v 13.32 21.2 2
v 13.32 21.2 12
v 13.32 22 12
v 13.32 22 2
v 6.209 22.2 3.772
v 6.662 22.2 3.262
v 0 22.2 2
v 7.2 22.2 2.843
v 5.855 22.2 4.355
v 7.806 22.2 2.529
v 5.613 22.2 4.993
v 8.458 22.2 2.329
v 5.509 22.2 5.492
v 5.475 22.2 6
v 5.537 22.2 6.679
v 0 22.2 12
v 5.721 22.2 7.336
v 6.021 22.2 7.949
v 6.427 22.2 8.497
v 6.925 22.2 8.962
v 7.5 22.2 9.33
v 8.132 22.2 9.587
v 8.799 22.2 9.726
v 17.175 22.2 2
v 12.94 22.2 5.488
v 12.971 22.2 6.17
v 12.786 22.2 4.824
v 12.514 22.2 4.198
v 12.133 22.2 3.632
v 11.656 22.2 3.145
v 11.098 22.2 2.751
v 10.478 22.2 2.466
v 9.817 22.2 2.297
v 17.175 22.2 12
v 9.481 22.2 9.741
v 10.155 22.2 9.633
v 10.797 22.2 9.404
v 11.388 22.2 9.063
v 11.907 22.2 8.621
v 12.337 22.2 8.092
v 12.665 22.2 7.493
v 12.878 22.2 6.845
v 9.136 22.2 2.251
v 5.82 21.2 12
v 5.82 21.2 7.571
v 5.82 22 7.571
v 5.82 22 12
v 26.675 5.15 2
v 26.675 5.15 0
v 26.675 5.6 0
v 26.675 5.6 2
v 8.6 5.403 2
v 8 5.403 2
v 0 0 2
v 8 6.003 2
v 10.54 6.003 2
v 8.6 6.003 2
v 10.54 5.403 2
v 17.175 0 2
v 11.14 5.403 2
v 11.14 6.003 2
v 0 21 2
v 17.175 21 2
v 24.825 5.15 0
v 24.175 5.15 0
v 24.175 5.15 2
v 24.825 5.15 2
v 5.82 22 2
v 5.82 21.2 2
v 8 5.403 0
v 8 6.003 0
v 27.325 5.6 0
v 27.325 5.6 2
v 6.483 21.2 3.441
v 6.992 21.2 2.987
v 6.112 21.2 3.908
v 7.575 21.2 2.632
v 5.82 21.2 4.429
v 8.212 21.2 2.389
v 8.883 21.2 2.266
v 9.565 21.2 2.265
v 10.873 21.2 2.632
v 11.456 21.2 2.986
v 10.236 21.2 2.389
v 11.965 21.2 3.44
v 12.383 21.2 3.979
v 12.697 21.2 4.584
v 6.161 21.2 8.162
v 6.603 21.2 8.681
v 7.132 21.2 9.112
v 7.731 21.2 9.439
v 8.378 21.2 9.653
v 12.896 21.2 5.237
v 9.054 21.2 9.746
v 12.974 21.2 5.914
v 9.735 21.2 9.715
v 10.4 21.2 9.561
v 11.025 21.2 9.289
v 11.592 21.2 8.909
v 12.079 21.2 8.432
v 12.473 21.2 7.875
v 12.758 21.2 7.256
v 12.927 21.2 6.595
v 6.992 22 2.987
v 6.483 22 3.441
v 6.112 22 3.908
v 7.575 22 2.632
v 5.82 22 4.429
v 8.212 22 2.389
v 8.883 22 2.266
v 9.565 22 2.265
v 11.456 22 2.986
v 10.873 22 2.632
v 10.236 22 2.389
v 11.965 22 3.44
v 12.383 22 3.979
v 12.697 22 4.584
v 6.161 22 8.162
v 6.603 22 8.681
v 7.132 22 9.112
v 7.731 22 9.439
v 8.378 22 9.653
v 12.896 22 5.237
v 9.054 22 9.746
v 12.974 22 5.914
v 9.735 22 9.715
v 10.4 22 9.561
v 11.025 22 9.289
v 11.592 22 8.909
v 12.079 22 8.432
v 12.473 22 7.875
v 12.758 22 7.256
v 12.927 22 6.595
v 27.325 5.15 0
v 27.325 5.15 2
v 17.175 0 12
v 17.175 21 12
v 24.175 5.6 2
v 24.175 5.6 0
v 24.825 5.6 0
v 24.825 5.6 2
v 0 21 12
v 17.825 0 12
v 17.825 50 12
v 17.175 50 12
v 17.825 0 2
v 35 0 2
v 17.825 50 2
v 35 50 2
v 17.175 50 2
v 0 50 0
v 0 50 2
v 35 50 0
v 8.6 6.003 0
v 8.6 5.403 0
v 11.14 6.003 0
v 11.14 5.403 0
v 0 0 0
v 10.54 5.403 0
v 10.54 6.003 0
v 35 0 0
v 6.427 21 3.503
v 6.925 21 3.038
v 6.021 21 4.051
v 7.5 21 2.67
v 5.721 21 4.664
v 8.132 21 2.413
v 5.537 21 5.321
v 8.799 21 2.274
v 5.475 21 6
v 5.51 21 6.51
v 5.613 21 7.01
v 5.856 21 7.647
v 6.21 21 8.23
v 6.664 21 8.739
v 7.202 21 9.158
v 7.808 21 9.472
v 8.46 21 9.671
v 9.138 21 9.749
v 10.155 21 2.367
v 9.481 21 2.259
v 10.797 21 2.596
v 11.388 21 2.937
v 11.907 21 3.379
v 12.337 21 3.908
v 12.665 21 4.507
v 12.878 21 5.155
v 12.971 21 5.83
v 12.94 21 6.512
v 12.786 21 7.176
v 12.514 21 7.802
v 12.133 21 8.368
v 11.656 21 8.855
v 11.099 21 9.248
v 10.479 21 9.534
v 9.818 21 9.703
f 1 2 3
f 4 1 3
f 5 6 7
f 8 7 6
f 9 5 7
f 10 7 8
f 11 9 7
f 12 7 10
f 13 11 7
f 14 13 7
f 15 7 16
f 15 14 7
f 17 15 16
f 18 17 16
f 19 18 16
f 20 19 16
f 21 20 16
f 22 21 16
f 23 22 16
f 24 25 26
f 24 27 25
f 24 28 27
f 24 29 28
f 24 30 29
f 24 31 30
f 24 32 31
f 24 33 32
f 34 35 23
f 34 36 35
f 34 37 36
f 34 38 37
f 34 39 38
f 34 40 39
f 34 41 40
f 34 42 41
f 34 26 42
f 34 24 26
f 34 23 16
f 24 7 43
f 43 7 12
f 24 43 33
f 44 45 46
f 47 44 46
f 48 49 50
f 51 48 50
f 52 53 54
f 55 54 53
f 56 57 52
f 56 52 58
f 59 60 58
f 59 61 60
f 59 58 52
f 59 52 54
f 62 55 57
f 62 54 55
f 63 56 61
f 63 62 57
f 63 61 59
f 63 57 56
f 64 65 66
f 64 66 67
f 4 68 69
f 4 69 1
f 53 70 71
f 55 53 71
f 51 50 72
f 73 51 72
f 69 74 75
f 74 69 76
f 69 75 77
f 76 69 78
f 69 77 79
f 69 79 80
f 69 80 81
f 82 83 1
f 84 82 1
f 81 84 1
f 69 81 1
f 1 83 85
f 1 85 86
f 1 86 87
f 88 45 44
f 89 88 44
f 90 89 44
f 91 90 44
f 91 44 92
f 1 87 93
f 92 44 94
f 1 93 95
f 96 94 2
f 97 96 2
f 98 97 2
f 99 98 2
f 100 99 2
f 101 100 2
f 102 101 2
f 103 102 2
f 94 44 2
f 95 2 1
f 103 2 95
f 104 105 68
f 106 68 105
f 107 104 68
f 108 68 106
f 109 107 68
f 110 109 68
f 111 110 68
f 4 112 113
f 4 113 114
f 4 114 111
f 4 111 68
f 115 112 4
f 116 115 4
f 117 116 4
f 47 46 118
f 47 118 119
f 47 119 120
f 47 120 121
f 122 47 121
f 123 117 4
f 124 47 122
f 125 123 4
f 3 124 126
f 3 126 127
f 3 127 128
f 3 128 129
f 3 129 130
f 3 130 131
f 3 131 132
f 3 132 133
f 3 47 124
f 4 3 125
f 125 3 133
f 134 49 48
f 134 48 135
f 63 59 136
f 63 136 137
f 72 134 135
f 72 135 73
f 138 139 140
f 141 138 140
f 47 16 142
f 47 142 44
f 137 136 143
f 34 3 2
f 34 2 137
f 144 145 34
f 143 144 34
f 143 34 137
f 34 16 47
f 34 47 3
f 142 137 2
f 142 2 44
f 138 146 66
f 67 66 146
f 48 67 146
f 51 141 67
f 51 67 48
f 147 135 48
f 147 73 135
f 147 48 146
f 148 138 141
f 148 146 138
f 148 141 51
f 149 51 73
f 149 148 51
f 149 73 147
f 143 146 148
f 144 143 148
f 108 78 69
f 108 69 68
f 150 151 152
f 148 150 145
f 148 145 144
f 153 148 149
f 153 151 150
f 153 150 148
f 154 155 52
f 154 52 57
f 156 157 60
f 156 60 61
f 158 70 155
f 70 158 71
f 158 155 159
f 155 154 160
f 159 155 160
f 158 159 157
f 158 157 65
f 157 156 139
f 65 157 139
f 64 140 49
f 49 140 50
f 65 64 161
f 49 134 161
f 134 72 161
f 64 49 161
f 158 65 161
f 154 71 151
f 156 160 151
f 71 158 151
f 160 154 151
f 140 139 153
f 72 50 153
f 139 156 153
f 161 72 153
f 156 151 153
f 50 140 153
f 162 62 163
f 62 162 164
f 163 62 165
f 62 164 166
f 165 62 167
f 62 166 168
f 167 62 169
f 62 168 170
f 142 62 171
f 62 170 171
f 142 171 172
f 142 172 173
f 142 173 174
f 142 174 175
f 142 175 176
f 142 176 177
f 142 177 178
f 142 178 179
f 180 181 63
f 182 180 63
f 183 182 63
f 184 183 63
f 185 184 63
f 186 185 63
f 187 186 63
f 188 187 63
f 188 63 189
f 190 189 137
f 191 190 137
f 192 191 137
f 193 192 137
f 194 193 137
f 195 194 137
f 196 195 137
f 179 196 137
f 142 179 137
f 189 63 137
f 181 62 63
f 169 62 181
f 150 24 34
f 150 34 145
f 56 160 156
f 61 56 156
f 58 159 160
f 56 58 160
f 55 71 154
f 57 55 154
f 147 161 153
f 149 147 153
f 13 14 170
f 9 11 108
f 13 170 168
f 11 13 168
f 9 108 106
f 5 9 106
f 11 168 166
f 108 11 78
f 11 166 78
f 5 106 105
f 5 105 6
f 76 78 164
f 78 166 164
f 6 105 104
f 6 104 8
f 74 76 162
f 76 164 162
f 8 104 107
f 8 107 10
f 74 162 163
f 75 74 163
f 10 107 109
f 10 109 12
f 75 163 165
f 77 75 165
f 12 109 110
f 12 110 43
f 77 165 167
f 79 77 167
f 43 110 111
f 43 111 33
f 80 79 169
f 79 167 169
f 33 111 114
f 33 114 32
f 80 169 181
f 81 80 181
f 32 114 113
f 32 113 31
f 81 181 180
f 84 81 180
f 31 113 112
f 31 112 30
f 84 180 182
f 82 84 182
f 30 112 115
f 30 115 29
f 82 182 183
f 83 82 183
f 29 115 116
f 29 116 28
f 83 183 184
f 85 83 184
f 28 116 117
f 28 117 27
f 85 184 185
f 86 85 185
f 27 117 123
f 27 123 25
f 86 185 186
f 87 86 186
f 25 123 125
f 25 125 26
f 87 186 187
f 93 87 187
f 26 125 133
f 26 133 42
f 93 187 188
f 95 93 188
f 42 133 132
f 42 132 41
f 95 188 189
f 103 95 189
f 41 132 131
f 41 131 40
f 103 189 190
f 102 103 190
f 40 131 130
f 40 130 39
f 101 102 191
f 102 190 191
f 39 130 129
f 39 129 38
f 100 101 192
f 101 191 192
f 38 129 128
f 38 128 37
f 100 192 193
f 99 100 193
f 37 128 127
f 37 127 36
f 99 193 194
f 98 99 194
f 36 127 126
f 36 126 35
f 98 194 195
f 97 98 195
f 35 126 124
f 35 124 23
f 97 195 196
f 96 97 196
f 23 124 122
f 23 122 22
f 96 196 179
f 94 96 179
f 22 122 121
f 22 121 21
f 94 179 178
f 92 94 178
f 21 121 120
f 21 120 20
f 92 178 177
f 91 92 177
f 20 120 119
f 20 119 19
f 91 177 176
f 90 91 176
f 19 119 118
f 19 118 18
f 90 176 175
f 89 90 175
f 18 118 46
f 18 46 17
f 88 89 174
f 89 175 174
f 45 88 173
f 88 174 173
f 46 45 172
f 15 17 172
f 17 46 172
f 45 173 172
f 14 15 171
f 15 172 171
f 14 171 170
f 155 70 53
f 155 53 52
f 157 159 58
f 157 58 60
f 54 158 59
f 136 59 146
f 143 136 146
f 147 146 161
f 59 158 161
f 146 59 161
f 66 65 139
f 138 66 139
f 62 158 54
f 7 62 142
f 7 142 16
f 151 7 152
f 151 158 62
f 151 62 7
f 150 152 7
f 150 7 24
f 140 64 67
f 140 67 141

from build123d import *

# Parameters (mm, degrees)
IZIM1_W                     = 35
IZIM1_H                     = 50
IZIM1_W_2                   = 0.6
IZIM1_H_2                   = 0.6
IZIM1_W_3                   = 0.65
IZIM1_H_3                   = 0.45
Y_KSEKLIK_EKSTR_ZYON1_DEPTH = 2
IZIM2_W                     = 0.65
IZIM2_H                     = 50
Y_KSEKLIK_EKSTR_ZYON2_DEPTH = 10
IZIM3_W                     = 10
IZIM3_H                     = 1.2
Y_KSEKLIK_EKSTR_ZYON3_DEPTH = 17.175
IZIM4_W                     = 7.5
IZIM4_H                     = 0.8
KES_EKSTR_ZYON1_DEPTH       = 10
KES_EKSTR_ZYON2_REACH       = 49.011
IZIM5_RX                    = 3.75
IZIM5_RY                    = 3.75


with BuildPart() as part:
    # Çizim1 → Yükseklik-Ekstrüzyon1 (new body)
    with BuildSketch(Plane.XY):
        with Locations((17.5, 25)):
            Rectangle(IZIM1_W, IZIM1_H)
        with Locations((8.3, 5.703429896)):
            Rectangle(IZIM1_W_2, IZIM1_H_2, mode=Mode.SUBTRACT)
        with Locations((10.84, 5.703429896)):
            Rectangle(IZIM1_W_2, IZIM1_H_2, mode=Mode.SUBTRACT)
        with Locations((27, 5.375)):
            Rectangle(IZIM1_W_3, IZIM1_H_3, mode=Mode.SUBTRACT)
        with Locations((24.5, 5.375)):
            Rectangle(IZIM1_W_3, IZIM1_H_3, mode=Mode.SUBTRACT)
    extrude(amount=Y_KSEKLIK_EKSTR_ZYON1_DEPTH)

    # Çizim2 → Yükseklik-Ekstrüzyon2 (add)
    with BuildSketch(Plane.XY.offset(2)):
        with Locations((17.5, 25)):
            Rectangle(IZIM2_W, IZIM2_H)
    extrude(amount=Y_KSEKLIK_EKSTR_ZYON2_DEPTH)

    # Çizim3 → Yükseklik-Ekstrüzyon3 (add, through all)
    with BuildSketch(Plane.ZY.offset(-17.175)):
        with Locations((7, 21.6)):
            Rectangle(IZIM3_W, IZIM3_H)
    extrude(amount=Y_KSEKLIK_EKSTR_ZYON3_DEPTH)

    # Çizim4 → Kes-Ekstrüzyon1 (cut)
    with BuildSketch(Plane.XY.offset(12)):
        with Locations((9.57, 21.6)):
            Rectangle(IZIM4_W, IZIM4_H)
    extrude(amount=-KES_EKSTR_ZYON1_DEPTH, mode=Mode.SUBTRACT)

    # Çizim5 → Kes-Ekstrüzyon2 (cut, up to next)
    with BuildSketch(Plane.XZ.offset(-21), mode=Mode.PRIVATE) as kes_ekstr_zyon2_sk1:
        with Locations(Location((9.224839589, 6), (0, 0, 180))):
            Ellipse(IZIM5_RX, IZIM5_RY)
    kes_ekstr_zyon2_tool1 = extrude(kes_ekstr_zyon2_sk1.sketch, amount=-KES_EKSTR_ZYON2_REACH, mode=Mode.PRIVATE) & part.part
    add(kes_ekstr_zyon2_tool1.solids().sort_by_distance((9.22484, 21, 6))[0], mode=Mode.SUBTRACT)


solid = part.part
